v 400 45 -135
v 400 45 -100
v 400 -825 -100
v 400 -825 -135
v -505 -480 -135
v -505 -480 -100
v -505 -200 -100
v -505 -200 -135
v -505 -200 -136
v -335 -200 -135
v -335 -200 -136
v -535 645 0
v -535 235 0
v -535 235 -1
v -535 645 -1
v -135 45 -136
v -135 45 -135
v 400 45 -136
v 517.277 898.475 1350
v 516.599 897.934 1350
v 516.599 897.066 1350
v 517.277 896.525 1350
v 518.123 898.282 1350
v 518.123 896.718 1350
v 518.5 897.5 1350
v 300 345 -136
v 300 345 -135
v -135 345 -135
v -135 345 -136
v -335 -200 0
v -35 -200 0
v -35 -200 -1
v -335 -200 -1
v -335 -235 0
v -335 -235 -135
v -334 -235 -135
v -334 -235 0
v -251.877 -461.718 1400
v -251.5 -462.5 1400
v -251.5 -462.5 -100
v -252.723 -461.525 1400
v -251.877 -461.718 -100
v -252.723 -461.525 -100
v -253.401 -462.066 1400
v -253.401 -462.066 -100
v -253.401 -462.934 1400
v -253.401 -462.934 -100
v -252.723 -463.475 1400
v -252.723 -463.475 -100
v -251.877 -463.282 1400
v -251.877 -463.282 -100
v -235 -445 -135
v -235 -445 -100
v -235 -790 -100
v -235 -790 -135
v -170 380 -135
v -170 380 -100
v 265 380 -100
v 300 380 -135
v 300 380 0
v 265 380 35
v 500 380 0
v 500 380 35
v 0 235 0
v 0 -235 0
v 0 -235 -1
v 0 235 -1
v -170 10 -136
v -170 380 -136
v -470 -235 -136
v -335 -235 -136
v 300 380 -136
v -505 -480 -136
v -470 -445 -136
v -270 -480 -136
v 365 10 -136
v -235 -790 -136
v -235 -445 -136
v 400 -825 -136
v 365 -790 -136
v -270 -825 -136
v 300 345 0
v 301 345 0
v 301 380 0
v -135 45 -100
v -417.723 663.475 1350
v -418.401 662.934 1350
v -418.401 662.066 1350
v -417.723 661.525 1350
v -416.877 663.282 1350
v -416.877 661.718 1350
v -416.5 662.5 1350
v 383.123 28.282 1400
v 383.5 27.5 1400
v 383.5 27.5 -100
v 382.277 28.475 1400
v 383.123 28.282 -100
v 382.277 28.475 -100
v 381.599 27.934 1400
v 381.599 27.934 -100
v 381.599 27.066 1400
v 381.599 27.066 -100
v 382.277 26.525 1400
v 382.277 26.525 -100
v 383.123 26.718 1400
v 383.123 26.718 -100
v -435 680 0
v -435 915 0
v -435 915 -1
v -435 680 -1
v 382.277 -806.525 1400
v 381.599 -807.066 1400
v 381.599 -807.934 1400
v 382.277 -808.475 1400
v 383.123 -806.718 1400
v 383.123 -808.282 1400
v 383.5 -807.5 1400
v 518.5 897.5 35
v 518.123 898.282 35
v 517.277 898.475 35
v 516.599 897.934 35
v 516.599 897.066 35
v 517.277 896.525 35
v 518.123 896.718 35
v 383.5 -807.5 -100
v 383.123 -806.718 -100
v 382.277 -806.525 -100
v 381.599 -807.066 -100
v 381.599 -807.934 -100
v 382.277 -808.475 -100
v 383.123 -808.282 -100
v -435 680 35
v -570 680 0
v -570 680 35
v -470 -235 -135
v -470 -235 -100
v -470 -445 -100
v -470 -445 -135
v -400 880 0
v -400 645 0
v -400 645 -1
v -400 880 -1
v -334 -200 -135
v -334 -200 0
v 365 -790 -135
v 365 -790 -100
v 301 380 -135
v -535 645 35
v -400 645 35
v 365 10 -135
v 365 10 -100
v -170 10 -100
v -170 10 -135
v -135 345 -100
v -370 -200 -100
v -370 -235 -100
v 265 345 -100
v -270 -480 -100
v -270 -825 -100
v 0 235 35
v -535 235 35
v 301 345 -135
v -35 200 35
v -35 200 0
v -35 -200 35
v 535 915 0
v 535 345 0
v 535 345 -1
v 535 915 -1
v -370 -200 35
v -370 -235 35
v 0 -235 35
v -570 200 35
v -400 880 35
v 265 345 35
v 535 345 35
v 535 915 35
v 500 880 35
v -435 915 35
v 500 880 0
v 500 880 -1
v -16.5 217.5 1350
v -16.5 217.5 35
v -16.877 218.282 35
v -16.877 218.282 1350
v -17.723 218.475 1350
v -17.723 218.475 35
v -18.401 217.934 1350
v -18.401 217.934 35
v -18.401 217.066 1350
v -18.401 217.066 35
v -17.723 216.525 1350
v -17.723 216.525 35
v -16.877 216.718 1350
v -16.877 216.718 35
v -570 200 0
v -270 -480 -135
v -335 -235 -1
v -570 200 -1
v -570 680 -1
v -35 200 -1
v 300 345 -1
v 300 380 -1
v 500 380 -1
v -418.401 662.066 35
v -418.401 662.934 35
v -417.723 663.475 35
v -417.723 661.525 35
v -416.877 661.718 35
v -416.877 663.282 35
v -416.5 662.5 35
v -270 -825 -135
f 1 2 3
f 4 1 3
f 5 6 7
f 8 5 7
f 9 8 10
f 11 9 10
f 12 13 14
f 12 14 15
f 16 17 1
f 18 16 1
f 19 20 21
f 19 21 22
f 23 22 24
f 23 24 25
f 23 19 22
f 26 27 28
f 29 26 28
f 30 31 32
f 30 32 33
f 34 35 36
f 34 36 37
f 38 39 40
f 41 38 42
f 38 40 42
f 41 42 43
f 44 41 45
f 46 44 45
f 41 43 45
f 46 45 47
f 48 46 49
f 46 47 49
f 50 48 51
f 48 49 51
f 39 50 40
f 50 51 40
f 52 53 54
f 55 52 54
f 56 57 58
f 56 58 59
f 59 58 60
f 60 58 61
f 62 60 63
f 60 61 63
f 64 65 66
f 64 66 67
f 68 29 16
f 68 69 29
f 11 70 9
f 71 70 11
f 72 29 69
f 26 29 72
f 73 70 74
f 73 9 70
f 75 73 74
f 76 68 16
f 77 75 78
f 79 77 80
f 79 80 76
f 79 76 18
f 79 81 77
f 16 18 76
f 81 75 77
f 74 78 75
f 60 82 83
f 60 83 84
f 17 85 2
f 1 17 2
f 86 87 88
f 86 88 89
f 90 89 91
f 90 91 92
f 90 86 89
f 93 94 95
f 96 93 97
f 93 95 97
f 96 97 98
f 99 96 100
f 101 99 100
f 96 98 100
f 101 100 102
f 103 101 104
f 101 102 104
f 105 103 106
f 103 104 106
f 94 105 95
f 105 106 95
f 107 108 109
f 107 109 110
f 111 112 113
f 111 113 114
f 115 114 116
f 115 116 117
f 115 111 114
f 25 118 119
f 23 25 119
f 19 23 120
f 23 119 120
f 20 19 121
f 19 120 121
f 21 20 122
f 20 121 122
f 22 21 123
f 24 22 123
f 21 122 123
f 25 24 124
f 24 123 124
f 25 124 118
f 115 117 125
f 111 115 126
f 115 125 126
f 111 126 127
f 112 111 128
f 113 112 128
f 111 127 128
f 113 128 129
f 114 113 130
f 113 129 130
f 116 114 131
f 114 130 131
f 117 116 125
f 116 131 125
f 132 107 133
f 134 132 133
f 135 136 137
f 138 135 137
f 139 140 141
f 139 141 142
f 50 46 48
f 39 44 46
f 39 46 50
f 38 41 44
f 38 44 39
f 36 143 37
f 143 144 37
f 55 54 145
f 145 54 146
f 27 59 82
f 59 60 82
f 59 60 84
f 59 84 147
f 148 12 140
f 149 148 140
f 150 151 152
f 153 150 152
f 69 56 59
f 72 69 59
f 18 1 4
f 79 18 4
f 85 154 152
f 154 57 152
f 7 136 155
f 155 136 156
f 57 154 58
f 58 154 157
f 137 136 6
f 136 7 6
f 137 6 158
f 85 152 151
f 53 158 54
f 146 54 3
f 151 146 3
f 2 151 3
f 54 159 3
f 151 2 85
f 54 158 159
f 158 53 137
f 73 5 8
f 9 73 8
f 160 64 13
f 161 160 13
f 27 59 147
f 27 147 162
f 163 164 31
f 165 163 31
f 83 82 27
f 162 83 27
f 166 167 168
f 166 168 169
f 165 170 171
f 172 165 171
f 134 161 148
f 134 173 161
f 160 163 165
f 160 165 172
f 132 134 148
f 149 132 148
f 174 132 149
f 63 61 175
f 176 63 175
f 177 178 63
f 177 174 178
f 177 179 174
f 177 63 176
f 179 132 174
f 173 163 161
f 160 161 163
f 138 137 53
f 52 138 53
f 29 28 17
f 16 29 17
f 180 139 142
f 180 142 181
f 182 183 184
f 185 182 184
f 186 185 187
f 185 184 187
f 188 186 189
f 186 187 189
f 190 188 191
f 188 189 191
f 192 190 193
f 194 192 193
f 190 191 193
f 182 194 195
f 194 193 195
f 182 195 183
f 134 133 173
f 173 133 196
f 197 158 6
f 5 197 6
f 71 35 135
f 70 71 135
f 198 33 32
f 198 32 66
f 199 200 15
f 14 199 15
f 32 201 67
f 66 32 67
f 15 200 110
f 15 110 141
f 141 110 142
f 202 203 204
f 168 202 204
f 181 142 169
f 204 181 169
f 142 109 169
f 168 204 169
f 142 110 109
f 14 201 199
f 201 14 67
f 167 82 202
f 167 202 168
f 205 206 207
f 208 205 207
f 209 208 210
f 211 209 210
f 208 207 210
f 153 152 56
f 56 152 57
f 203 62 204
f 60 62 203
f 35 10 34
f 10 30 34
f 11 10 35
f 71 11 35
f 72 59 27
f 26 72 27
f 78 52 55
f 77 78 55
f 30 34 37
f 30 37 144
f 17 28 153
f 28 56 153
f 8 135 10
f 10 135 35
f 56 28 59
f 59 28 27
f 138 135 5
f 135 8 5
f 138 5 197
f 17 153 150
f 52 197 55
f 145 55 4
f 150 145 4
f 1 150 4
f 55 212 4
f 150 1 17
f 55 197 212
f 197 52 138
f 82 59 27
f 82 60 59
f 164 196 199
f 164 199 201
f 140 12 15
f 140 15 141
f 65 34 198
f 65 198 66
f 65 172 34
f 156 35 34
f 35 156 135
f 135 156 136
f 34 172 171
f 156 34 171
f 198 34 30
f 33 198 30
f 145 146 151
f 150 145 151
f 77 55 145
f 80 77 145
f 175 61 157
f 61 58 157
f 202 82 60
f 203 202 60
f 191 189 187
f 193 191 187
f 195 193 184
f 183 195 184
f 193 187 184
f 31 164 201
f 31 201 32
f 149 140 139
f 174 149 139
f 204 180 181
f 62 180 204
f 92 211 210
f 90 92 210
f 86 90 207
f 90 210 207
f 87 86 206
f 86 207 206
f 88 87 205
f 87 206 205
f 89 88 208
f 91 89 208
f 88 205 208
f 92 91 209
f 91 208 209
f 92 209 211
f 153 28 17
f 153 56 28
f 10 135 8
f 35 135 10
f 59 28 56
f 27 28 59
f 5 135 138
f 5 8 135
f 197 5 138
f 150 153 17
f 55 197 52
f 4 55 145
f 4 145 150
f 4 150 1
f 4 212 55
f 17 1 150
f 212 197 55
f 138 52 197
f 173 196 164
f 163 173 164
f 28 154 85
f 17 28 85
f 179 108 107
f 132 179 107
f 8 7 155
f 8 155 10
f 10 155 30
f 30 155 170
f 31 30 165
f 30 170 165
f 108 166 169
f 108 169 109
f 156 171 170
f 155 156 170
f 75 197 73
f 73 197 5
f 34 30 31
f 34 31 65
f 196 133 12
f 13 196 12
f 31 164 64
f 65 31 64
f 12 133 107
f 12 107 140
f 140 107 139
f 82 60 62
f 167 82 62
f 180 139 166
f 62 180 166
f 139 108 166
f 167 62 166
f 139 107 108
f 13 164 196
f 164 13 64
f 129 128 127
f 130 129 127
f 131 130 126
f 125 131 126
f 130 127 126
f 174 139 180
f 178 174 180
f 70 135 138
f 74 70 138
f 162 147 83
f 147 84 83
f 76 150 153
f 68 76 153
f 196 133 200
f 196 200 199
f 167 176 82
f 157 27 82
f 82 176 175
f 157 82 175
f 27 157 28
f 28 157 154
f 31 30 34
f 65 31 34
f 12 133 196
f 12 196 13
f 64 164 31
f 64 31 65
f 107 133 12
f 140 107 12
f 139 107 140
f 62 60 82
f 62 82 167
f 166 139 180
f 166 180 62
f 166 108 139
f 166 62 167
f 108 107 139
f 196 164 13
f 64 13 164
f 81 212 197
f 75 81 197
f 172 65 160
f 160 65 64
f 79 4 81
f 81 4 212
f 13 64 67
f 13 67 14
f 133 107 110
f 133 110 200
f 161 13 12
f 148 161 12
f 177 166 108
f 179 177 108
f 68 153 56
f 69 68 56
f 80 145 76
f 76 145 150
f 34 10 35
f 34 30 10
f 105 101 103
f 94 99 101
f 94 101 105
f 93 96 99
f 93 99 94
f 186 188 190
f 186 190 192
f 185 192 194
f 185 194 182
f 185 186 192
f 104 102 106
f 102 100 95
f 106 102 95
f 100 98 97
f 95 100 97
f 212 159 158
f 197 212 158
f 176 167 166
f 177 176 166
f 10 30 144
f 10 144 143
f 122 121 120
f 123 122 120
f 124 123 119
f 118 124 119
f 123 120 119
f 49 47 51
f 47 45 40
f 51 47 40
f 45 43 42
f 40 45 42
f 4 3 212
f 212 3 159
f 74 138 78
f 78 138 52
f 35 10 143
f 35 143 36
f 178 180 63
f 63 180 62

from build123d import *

# Parameters (mm, degrees)
F1_DEPTH  = 35
F2_W      = 35
F2_H      = 35
F3_DEPTH  = 100
F6_DEPTH  = 35
F7_DEPTH  = 1
F8_DEPTH  = 1
F9_DEPTH  = 1
F10_R     = 1
F11_DEPTH = 1500
F12_R     = 1
F13_DEPTH = 1315


with BuildPart() as f1:
    # F0 (on Top) → F1 (new body)
    with BuildSketch(Plane.XY):
        Polygon((500, 880), (500, 380), (265, 380), (265, 345), (535, 345), (535, 915), (-435, 915), (-435, 680), (-570, 680), (-570, 200), (-35, 200), (-35, -200), (-370, -200), (-370, -235), (0, -235), (0, 235), (-535, 235), (-535, 645), (-400, 645), (-400, 880), align=None)
    extrude(amount=F1_DEPTH)

    # F2 (on Top) → F3 (join)
    with BuildSketch(Plane.XY):
        with Locations((-352.5, -217.5)):
            Rectangle(F2_W, F2_H)
        with Locations((282.5, 362.5)):
            Rectangle(F2_W, F2_H)
    extrude(amount=-F3_DEPTH)

    # F5 (on offset) → F6 (join)
    with BuildSketch(Plane(origin=(0, 0, -100), x_dir=(1, 0, 0), z_dir=(0, 0, -1))):
        Polygon((-170, -10), (-170, -380), (300, -380), (300, -345), (-135, -345), (-135, -45), (400, -45), (400, 825), (-270, 825), (-270, 480), (-505, 480), (-505, 200), (-335, 200), (-335, 235), (-470, 235), (-470, 445), (-235, 445), (-235, 790), (365, 790), (365, -10), align=None)
    extrude(amount=F6_DEPTH)


with BuildPart() as f7:
    # F7 (new): a face of the model
    f7_faces = [f1.part.faces().sort_by_distance(p)[0] for p in [
        (-154.9299966822, 195, -135),
    ]]
    extrude(f7_faces, amount=F7_DEPTH)


with BuildPart() as f8:
    # F8 (new): a face of the model
    f8_faces = [f1.part.faces().sort_by_distance(p)[0] for p in [
        (-335, -217.5, -67.5),
    ]]
    extrude(f8_faces, amount=F8_DEPTH)


with BuildPart() as f8b:
    # F8#2 (new): a face of the model
    f8_2_faces = [f1.part.faces().sort_by_distance(p)[0] for p in [
        (300, 362.5, -67.5),
    ]]
    extrude(f8_2_faces, amount=F8_DEPTH)


with BuildPart() as f9:
    # F9 (new): a face of the model
    f9_faces = [f1.part.faces().sort_by_distance(p)[0] for p in [
        (50, 895.9484325249, 0),
    ]]
    extrude(f9_faces, amount=F9_DEPTH)


with BuildPart() as f11:
    # F10 (on face) → F11 (new body)
    with BuildSketch(Plane.XY.offset(-100)):
        with Locations((-252.5, -462.5)):
            Circle(F10_R)
    extrude(amount=F11_DEPTH)


with BuildPart() as f11b:
    # F10 (on face) → F11, piece 2 (new body)
    with BuildSketch(Plane.XY.offset(-100)):
        with Locations((382.5, 27.5)):
            Circle(F10_R)
    extrude(amount=F11_DEPTH)


with BuildPart() as f11c:
    # F10 (on face) → F11, piece 3 (new body)
    with BuildSketch(Plane.XY.offset(-100)):
        with Locations((382.5, -807.5)):
            Circle(F10_R)
    extrude(amount=F11_DEPTH)


with BuildPart() as f13:
    # F12 (on face) → F13 (new body)
    with BuildSketch(Plane.XY.offset(35)):
        with Locations((-417.5, 662.5)):
            Circle(F12_R)
    extrude(amount=F13_DEPTH)


with BuildPart() as f13b:
    # F12 (on face) → F13, piece 2 (new body)
    with BuildSketch(Plane.XY.offset(35)):
        with Locations((517.5, 897.5)):
            Circle(F12_R)
    extrude(amount=F13_DEPTH)


with BuildPart() as f13c:
    # F12 (on face) → F13, piece 3 (new body)
    with BuildSketch(Plane.XY.offset(35)):
        with Locations((-17.5, 217.5)):
            Circle(F12_R)
    extrude(amount=F13_DEPTH)


solid = Compound([f1.part, f7.part, f8.part, f8b.part, f9.part, f11.part, f11b.part, f11c.part, f13.part, f13b.part, f13c.part])
